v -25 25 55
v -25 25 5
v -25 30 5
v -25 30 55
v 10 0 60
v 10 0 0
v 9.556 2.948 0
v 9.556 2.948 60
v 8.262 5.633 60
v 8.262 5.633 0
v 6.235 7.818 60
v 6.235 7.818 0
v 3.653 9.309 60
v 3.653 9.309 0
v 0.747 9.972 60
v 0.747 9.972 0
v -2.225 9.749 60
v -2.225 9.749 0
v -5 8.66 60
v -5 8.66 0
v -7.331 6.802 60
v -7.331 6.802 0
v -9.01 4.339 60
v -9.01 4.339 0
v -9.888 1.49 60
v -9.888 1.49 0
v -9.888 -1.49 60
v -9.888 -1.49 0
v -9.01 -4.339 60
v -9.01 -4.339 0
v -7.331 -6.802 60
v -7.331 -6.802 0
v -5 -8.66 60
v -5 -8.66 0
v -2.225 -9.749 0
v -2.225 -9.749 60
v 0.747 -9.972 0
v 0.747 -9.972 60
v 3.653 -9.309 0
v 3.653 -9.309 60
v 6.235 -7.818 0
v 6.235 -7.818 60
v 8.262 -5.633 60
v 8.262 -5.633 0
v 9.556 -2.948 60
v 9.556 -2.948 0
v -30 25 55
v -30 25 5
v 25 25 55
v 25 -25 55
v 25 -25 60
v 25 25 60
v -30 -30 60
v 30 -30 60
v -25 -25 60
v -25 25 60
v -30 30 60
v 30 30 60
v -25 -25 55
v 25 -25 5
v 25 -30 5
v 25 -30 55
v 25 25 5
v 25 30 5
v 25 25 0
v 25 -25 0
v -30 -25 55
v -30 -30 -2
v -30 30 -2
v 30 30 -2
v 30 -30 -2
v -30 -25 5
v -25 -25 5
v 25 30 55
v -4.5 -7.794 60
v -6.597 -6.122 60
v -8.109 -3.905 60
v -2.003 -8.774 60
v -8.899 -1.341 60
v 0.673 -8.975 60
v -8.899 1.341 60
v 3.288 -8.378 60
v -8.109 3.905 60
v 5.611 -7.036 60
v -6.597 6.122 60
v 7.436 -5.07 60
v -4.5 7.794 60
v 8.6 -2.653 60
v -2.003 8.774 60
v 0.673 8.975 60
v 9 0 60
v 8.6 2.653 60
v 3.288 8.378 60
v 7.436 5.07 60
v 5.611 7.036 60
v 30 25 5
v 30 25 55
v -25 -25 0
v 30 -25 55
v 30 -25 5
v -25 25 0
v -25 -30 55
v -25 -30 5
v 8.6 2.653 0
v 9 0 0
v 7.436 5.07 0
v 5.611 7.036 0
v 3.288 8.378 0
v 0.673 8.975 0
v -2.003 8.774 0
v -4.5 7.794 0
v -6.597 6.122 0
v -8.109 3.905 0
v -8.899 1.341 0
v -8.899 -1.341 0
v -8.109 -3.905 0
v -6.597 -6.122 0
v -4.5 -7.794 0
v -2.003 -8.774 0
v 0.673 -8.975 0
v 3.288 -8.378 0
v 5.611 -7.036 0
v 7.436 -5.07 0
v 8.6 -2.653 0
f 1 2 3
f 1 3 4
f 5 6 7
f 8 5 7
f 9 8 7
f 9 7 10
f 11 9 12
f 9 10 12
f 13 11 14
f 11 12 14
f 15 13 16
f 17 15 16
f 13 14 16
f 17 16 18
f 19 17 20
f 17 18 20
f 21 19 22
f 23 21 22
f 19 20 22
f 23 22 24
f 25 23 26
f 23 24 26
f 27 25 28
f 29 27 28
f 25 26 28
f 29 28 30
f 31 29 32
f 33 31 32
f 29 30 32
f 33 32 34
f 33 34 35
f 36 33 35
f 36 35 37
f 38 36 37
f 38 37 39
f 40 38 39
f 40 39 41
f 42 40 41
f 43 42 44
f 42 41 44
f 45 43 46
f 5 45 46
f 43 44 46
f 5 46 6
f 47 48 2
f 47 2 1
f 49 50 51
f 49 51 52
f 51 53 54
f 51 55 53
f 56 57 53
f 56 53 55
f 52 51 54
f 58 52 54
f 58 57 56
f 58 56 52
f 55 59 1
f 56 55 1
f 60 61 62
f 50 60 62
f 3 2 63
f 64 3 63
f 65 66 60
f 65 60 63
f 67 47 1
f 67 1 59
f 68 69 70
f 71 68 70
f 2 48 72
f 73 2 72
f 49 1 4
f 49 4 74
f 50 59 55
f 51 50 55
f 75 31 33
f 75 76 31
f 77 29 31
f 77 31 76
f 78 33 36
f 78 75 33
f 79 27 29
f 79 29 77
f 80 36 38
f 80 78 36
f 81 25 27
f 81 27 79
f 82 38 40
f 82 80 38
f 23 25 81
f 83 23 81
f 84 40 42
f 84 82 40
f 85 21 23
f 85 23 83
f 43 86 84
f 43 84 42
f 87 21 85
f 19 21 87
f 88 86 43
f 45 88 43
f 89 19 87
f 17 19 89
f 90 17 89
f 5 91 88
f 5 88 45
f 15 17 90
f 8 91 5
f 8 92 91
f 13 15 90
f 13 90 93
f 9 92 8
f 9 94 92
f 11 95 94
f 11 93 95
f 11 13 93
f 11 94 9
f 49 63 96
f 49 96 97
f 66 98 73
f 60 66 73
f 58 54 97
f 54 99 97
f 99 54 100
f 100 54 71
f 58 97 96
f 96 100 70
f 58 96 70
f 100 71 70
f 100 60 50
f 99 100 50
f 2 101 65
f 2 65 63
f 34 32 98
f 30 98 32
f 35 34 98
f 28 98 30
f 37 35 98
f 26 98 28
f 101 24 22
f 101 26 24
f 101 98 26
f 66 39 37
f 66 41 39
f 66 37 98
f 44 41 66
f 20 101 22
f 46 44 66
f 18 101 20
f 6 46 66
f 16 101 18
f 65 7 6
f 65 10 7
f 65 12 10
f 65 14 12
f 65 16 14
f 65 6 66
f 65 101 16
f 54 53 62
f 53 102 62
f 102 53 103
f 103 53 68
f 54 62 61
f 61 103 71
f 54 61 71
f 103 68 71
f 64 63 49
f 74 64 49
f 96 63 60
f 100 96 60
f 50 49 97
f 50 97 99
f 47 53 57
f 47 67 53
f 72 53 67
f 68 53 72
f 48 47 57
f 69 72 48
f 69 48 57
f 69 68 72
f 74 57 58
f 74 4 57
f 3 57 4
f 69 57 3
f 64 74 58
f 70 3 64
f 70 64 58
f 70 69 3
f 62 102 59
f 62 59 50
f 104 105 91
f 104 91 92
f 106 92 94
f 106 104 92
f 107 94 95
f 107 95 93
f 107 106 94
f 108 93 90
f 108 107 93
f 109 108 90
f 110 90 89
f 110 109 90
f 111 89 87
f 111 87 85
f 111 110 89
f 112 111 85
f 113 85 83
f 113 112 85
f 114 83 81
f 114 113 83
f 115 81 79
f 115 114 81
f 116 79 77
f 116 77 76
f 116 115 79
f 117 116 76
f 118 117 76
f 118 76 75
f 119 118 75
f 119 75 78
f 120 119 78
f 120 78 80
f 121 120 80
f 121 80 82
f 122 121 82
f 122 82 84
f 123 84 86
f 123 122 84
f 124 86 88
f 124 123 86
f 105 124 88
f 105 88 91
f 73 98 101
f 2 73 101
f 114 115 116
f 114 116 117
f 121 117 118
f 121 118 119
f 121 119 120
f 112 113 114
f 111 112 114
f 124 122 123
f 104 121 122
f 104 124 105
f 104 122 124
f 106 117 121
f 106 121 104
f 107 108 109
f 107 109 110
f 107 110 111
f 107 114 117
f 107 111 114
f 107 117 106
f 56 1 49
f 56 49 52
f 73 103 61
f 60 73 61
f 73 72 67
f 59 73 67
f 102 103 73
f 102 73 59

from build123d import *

# Parameters (mm, degrees)
F0_W     = 60
F0_H     = 60
F0_W_2   = 50
F0_H_2   = 50
F0_R     = 10
F0_R_2   = 9
F1_DEPTH = 2
F2_DEPTH = 60
F3_W     = 50
F3_H     = 50
F4_DEPTH = 60.001
F5_W     = 50
F5_H     = 50
F6_DEPTH = 60.001
F7_DEPTH = 60


with BuildPart() as f1:
    # F0 (on Top) → F1 (new body)
    with BuildSketch(Plane.XY):
        Rectangle(F0_W, F0_H)
        Rectangle(F0_W_2, F0_H_2, mode=Mode.SUBTRACT)
        Rectangle(F0_W_2, F0_H_2)
        Circle(F0_R, mode=Mode.SUBTRACT)
        Circle(F0_R)
        Circle(F0_R_2, mode=Mode.SUBTRACT)
        Circle(F0_R_2)
    extrude(amount=-F1_DEPTH)

    # F0 (on Top) → F2 (join)
    with BuildSketch(Plane.XY):
        Rectangle(F0_W, F0_H)
        Rectangle(F0_W_2, F0_H_2, mode=Mode.SUBTRACT)
    extrude(amount=F2_DEPTH)

    # F3 (on face) → F4 (cut, through all)
    with BuildSketch(Plane(origin=(-30, 0, 0), x_dir=(0, -1, 0), z_dir=(-1, 0, 0))):
        with Locations((0, 30)):
            Rectangle(F3_W, F3_H)
    extrude(amount=-F4_DEPTH, mode=Mode.SUBTRACT)

    # F5 (on face) → F6 (cut, through all)
    with BuildSketch(Plane.XZ.offset(30)):
        with Locations((0, 30)):
            Rectangle(F5_W, F5_H)
    extrude(amount=-F6_DEPTH, mode=Mode.SUBTRACT)

    # F0 (on Top) → F7 (join)
    with BuildSketch(Plane.XY):
        Circle(F0_R)
        Circle(F0_R_2, mode=Mode.SUBTRACT)
    extrude(amount=F7_DEPTH)


solid = f1.part
